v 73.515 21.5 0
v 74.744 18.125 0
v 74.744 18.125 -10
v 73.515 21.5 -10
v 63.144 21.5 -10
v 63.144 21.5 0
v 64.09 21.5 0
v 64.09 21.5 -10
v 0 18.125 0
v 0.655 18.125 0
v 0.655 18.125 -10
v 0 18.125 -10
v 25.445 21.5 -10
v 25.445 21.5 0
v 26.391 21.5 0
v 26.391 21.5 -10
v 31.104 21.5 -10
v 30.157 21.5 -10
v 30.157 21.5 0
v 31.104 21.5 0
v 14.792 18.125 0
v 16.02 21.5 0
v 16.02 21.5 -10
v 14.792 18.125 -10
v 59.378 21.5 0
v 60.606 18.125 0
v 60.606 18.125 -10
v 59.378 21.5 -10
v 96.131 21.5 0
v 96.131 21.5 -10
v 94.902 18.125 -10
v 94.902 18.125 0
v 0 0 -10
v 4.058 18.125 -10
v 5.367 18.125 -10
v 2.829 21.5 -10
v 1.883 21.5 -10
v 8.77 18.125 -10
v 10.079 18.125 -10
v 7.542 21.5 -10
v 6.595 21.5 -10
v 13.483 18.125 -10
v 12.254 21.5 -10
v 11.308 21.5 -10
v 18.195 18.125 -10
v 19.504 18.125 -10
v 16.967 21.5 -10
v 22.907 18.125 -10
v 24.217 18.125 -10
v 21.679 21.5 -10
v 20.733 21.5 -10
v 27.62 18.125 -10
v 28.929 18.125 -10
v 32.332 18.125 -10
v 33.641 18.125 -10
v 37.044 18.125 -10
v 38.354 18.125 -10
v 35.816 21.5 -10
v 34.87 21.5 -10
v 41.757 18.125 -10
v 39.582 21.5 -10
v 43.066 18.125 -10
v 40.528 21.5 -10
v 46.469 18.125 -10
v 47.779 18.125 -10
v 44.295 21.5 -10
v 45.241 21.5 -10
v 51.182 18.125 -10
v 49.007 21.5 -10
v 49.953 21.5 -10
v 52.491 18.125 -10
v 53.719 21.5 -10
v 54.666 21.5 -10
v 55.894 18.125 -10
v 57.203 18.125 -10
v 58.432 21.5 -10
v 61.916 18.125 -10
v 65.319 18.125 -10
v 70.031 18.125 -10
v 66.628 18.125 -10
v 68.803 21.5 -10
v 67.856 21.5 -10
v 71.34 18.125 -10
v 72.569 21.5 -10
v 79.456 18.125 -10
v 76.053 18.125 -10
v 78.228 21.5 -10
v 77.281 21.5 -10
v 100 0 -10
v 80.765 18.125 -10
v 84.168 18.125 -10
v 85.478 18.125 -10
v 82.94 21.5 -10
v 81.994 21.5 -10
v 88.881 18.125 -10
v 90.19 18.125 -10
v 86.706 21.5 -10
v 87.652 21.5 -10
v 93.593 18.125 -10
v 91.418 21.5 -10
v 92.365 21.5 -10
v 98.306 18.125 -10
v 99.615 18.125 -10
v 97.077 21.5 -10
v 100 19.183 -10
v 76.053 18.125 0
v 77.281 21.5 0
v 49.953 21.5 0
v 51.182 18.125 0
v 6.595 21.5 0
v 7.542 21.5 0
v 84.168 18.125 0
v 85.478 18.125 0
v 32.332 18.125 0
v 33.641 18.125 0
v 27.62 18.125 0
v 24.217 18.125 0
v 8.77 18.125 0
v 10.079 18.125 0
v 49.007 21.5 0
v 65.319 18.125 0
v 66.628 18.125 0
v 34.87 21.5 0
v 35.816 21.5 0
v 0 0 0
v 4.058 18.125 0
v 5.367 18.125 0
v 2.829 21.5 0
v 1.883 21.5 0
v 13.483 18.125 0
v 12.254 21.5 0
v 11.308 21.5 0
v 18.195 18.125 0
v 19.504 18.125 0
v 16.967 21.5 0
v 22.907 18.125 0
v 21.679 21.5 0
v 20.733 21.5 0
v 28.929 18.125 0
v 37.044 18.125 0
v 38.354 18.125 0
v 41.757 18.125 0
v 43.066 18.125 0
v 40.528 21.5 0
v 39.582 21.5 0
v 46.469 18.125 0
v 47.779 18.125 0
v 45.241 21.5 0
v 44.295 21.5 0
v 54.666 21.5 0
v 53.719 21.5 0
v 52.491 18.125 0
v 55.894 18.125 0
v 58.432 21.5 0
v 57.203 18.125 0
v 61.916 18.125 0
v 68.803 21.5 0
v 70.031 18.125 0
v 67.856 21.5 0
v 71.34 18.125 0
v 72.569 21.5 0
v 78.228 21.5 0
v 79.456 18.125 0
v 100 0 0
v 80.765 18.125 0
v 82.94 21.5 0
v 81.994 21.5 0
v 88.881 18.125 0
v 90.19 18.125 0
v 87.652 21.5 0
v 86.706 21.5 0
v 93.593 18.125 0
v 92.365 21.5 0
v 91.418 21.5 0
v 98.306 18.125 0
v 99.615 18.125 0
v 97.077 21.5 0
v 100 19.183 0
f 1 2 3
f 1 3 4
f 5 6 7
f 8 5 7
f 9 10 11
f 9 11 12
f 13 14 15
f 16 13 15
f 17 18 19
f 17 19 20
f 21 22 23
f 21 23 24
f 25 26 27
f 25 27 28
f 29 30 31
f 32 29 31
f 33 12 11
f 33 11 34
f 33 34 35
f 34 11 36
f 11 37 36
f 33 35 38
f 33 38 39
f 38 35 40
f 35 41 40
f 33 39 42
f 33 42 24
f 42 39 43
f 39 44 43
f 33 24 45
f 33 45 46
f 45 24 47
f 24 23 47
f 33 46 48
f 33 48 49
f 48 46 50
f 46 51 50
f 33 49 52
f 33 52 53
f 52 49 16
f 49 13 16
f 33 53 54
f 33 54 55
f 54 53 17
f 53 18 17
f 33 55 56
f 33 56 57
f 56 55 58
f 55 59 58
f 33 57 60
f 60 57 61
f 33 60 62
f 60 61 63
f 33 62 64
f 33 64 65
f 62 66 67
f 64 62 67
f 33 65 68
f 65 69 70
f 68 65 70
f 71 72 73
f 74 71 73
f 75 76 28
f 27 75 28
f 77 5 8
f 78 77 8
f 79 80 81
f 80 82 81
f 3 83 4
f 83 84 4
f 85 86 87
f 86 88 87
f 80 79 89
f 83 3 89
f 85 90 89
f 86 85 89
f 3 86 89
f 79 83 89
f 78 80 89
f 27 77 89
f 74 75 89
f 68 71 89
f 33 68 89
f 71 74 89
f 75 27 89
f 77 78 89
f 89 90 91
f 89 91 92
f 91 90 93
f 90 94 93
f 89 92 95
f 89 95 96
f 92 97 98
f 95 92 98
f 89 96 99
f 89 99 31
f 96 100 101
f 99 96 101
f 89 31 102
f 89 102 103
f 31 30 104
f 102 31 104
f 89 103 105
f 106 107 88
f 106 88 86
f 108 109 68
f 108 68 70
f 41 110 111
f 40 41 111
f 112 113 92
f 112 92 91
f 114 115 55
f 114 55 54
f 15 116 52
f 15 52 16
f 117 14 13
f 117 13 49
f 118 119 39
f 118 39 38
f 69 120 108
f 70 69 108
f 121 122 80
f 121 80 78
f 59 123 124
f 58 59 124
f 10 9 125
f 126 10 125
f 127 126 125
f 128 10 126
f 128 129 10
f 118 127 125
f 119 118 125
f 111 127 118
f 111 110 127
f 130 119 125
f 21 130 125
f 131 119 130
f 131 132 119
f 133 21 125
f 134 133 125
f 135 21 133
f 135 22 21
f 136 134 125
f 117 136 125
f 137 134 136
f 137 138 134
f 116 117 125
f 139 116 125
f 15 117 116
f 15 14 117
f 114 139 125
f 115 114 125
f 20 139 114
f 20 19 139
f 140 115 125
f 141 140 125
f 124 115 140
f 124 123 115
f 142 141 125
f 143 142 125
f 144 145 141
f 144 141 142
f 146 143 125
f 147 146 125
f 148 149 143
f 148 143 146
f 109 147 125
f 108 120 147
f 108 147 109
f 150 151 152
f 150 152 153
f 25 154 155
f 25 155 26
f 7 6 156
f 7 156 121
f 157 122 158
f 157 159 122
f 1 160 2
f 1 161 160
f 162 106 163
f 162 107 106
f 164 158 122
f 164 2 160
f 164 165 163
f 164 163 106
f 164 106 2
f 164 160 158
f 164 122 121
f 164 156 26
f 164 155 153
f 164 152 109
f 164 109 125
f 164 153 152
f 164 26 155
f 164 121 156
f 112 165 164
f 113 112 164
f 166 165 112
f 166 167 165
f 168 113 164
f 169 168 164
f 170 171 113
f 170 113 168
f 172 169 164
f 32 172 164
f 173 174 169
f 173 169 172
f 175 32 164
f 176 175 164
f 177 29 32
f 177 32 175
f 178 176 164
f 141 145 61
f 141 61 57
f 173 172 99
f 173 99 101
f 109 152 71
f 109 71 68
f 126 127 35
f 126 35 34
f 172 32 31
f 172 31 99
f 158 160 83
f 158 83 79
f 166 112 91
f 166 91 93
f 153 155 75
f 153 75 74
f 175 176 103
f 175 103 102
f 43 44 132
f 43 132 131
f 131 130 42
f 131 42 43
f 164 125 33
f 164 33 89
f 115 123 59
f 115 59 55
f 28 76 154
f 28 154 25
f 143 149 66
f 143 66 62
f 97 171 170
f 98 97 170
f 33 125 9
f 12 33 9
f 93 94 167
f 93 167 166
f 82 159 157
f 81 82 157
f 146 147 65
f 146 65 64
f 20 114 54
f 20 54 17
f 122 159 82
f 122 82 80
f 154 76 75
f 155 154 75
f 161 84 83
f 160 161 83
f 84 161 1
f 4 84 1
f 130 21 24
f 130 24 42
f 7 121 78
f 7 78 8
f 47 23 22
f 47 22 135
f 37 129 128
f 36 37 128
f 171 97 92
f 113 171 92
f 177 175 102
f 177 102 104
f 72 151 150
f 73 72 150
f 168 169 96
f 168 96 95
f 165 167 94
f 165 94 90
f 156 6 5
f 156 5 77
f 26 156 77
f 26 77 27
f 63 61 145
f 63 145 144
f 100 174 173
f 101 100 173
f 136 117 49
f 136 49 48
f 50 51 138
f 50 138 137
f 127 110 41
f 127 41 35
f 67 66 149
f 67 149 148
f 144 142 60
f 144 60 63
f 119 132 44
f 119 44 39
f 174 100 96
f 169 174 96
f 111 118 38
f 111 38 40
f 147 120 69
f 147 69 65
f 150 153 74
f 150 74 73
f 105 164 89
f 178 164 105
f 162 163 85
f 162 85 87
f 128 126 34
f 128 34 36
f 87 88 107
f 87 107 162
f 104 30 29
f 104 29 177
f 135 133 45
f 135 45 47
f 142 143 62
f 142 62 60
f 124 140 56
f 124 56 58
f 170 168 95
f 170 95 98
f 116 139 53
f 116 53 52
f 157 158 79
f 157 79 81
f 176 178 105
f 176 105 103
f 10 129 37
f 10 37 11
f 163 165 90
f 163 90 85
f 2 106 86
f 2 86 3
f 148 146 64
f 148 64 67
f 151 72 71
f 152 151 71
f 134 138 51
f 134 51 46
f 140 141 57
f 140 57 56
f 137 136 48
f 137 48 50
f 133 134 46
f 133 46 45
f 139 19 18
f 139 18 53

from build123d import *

# Parameters (mm, degrees)
BLANKSKE_W        = 100
BLANKSKE_H        = 21.5
BLANK_DEPTH       = 10
TOOTHCUTSIM_DEPTH = 103.772807688
TEETHCUTS_COUNT   = 22
TEETHCUTS_PITCH   = 4.712388975


with BuildPart() as part:
    # BlankSke → Blank (new body)
    with BuildSketch(Plane.XY):
        with Locations((50, 10.75)):
            Rectangle(BLANKSKE_W, BLANKSKE_H)
    extrude(amount=-BLANK_DEPTH)

    # TooCutSkeSim → ToothCutSim (cut, through all)
    with BuildSketch(Plane.XY):
        Polygon((0.654653055, 18.125), (-0.654653055, 18.125), (-1.892297439, 21.5254), (1.892297439, 21.5254), align=None)
    toothcutsim = extrude(amount=-TOOTHCUTSIM_DEPTH, mode=Mode.SUBTRACT)

    # TeethCuts: ToothCutSim ×22
    with Locations(*[(i * TEETHCUTS_PITCH, 0, 0) for i in range(1, TEETHCUTS_COUNT)]):
        add(toothcutsim, mode=Mode.SUBTRACT)


solid = part.part
